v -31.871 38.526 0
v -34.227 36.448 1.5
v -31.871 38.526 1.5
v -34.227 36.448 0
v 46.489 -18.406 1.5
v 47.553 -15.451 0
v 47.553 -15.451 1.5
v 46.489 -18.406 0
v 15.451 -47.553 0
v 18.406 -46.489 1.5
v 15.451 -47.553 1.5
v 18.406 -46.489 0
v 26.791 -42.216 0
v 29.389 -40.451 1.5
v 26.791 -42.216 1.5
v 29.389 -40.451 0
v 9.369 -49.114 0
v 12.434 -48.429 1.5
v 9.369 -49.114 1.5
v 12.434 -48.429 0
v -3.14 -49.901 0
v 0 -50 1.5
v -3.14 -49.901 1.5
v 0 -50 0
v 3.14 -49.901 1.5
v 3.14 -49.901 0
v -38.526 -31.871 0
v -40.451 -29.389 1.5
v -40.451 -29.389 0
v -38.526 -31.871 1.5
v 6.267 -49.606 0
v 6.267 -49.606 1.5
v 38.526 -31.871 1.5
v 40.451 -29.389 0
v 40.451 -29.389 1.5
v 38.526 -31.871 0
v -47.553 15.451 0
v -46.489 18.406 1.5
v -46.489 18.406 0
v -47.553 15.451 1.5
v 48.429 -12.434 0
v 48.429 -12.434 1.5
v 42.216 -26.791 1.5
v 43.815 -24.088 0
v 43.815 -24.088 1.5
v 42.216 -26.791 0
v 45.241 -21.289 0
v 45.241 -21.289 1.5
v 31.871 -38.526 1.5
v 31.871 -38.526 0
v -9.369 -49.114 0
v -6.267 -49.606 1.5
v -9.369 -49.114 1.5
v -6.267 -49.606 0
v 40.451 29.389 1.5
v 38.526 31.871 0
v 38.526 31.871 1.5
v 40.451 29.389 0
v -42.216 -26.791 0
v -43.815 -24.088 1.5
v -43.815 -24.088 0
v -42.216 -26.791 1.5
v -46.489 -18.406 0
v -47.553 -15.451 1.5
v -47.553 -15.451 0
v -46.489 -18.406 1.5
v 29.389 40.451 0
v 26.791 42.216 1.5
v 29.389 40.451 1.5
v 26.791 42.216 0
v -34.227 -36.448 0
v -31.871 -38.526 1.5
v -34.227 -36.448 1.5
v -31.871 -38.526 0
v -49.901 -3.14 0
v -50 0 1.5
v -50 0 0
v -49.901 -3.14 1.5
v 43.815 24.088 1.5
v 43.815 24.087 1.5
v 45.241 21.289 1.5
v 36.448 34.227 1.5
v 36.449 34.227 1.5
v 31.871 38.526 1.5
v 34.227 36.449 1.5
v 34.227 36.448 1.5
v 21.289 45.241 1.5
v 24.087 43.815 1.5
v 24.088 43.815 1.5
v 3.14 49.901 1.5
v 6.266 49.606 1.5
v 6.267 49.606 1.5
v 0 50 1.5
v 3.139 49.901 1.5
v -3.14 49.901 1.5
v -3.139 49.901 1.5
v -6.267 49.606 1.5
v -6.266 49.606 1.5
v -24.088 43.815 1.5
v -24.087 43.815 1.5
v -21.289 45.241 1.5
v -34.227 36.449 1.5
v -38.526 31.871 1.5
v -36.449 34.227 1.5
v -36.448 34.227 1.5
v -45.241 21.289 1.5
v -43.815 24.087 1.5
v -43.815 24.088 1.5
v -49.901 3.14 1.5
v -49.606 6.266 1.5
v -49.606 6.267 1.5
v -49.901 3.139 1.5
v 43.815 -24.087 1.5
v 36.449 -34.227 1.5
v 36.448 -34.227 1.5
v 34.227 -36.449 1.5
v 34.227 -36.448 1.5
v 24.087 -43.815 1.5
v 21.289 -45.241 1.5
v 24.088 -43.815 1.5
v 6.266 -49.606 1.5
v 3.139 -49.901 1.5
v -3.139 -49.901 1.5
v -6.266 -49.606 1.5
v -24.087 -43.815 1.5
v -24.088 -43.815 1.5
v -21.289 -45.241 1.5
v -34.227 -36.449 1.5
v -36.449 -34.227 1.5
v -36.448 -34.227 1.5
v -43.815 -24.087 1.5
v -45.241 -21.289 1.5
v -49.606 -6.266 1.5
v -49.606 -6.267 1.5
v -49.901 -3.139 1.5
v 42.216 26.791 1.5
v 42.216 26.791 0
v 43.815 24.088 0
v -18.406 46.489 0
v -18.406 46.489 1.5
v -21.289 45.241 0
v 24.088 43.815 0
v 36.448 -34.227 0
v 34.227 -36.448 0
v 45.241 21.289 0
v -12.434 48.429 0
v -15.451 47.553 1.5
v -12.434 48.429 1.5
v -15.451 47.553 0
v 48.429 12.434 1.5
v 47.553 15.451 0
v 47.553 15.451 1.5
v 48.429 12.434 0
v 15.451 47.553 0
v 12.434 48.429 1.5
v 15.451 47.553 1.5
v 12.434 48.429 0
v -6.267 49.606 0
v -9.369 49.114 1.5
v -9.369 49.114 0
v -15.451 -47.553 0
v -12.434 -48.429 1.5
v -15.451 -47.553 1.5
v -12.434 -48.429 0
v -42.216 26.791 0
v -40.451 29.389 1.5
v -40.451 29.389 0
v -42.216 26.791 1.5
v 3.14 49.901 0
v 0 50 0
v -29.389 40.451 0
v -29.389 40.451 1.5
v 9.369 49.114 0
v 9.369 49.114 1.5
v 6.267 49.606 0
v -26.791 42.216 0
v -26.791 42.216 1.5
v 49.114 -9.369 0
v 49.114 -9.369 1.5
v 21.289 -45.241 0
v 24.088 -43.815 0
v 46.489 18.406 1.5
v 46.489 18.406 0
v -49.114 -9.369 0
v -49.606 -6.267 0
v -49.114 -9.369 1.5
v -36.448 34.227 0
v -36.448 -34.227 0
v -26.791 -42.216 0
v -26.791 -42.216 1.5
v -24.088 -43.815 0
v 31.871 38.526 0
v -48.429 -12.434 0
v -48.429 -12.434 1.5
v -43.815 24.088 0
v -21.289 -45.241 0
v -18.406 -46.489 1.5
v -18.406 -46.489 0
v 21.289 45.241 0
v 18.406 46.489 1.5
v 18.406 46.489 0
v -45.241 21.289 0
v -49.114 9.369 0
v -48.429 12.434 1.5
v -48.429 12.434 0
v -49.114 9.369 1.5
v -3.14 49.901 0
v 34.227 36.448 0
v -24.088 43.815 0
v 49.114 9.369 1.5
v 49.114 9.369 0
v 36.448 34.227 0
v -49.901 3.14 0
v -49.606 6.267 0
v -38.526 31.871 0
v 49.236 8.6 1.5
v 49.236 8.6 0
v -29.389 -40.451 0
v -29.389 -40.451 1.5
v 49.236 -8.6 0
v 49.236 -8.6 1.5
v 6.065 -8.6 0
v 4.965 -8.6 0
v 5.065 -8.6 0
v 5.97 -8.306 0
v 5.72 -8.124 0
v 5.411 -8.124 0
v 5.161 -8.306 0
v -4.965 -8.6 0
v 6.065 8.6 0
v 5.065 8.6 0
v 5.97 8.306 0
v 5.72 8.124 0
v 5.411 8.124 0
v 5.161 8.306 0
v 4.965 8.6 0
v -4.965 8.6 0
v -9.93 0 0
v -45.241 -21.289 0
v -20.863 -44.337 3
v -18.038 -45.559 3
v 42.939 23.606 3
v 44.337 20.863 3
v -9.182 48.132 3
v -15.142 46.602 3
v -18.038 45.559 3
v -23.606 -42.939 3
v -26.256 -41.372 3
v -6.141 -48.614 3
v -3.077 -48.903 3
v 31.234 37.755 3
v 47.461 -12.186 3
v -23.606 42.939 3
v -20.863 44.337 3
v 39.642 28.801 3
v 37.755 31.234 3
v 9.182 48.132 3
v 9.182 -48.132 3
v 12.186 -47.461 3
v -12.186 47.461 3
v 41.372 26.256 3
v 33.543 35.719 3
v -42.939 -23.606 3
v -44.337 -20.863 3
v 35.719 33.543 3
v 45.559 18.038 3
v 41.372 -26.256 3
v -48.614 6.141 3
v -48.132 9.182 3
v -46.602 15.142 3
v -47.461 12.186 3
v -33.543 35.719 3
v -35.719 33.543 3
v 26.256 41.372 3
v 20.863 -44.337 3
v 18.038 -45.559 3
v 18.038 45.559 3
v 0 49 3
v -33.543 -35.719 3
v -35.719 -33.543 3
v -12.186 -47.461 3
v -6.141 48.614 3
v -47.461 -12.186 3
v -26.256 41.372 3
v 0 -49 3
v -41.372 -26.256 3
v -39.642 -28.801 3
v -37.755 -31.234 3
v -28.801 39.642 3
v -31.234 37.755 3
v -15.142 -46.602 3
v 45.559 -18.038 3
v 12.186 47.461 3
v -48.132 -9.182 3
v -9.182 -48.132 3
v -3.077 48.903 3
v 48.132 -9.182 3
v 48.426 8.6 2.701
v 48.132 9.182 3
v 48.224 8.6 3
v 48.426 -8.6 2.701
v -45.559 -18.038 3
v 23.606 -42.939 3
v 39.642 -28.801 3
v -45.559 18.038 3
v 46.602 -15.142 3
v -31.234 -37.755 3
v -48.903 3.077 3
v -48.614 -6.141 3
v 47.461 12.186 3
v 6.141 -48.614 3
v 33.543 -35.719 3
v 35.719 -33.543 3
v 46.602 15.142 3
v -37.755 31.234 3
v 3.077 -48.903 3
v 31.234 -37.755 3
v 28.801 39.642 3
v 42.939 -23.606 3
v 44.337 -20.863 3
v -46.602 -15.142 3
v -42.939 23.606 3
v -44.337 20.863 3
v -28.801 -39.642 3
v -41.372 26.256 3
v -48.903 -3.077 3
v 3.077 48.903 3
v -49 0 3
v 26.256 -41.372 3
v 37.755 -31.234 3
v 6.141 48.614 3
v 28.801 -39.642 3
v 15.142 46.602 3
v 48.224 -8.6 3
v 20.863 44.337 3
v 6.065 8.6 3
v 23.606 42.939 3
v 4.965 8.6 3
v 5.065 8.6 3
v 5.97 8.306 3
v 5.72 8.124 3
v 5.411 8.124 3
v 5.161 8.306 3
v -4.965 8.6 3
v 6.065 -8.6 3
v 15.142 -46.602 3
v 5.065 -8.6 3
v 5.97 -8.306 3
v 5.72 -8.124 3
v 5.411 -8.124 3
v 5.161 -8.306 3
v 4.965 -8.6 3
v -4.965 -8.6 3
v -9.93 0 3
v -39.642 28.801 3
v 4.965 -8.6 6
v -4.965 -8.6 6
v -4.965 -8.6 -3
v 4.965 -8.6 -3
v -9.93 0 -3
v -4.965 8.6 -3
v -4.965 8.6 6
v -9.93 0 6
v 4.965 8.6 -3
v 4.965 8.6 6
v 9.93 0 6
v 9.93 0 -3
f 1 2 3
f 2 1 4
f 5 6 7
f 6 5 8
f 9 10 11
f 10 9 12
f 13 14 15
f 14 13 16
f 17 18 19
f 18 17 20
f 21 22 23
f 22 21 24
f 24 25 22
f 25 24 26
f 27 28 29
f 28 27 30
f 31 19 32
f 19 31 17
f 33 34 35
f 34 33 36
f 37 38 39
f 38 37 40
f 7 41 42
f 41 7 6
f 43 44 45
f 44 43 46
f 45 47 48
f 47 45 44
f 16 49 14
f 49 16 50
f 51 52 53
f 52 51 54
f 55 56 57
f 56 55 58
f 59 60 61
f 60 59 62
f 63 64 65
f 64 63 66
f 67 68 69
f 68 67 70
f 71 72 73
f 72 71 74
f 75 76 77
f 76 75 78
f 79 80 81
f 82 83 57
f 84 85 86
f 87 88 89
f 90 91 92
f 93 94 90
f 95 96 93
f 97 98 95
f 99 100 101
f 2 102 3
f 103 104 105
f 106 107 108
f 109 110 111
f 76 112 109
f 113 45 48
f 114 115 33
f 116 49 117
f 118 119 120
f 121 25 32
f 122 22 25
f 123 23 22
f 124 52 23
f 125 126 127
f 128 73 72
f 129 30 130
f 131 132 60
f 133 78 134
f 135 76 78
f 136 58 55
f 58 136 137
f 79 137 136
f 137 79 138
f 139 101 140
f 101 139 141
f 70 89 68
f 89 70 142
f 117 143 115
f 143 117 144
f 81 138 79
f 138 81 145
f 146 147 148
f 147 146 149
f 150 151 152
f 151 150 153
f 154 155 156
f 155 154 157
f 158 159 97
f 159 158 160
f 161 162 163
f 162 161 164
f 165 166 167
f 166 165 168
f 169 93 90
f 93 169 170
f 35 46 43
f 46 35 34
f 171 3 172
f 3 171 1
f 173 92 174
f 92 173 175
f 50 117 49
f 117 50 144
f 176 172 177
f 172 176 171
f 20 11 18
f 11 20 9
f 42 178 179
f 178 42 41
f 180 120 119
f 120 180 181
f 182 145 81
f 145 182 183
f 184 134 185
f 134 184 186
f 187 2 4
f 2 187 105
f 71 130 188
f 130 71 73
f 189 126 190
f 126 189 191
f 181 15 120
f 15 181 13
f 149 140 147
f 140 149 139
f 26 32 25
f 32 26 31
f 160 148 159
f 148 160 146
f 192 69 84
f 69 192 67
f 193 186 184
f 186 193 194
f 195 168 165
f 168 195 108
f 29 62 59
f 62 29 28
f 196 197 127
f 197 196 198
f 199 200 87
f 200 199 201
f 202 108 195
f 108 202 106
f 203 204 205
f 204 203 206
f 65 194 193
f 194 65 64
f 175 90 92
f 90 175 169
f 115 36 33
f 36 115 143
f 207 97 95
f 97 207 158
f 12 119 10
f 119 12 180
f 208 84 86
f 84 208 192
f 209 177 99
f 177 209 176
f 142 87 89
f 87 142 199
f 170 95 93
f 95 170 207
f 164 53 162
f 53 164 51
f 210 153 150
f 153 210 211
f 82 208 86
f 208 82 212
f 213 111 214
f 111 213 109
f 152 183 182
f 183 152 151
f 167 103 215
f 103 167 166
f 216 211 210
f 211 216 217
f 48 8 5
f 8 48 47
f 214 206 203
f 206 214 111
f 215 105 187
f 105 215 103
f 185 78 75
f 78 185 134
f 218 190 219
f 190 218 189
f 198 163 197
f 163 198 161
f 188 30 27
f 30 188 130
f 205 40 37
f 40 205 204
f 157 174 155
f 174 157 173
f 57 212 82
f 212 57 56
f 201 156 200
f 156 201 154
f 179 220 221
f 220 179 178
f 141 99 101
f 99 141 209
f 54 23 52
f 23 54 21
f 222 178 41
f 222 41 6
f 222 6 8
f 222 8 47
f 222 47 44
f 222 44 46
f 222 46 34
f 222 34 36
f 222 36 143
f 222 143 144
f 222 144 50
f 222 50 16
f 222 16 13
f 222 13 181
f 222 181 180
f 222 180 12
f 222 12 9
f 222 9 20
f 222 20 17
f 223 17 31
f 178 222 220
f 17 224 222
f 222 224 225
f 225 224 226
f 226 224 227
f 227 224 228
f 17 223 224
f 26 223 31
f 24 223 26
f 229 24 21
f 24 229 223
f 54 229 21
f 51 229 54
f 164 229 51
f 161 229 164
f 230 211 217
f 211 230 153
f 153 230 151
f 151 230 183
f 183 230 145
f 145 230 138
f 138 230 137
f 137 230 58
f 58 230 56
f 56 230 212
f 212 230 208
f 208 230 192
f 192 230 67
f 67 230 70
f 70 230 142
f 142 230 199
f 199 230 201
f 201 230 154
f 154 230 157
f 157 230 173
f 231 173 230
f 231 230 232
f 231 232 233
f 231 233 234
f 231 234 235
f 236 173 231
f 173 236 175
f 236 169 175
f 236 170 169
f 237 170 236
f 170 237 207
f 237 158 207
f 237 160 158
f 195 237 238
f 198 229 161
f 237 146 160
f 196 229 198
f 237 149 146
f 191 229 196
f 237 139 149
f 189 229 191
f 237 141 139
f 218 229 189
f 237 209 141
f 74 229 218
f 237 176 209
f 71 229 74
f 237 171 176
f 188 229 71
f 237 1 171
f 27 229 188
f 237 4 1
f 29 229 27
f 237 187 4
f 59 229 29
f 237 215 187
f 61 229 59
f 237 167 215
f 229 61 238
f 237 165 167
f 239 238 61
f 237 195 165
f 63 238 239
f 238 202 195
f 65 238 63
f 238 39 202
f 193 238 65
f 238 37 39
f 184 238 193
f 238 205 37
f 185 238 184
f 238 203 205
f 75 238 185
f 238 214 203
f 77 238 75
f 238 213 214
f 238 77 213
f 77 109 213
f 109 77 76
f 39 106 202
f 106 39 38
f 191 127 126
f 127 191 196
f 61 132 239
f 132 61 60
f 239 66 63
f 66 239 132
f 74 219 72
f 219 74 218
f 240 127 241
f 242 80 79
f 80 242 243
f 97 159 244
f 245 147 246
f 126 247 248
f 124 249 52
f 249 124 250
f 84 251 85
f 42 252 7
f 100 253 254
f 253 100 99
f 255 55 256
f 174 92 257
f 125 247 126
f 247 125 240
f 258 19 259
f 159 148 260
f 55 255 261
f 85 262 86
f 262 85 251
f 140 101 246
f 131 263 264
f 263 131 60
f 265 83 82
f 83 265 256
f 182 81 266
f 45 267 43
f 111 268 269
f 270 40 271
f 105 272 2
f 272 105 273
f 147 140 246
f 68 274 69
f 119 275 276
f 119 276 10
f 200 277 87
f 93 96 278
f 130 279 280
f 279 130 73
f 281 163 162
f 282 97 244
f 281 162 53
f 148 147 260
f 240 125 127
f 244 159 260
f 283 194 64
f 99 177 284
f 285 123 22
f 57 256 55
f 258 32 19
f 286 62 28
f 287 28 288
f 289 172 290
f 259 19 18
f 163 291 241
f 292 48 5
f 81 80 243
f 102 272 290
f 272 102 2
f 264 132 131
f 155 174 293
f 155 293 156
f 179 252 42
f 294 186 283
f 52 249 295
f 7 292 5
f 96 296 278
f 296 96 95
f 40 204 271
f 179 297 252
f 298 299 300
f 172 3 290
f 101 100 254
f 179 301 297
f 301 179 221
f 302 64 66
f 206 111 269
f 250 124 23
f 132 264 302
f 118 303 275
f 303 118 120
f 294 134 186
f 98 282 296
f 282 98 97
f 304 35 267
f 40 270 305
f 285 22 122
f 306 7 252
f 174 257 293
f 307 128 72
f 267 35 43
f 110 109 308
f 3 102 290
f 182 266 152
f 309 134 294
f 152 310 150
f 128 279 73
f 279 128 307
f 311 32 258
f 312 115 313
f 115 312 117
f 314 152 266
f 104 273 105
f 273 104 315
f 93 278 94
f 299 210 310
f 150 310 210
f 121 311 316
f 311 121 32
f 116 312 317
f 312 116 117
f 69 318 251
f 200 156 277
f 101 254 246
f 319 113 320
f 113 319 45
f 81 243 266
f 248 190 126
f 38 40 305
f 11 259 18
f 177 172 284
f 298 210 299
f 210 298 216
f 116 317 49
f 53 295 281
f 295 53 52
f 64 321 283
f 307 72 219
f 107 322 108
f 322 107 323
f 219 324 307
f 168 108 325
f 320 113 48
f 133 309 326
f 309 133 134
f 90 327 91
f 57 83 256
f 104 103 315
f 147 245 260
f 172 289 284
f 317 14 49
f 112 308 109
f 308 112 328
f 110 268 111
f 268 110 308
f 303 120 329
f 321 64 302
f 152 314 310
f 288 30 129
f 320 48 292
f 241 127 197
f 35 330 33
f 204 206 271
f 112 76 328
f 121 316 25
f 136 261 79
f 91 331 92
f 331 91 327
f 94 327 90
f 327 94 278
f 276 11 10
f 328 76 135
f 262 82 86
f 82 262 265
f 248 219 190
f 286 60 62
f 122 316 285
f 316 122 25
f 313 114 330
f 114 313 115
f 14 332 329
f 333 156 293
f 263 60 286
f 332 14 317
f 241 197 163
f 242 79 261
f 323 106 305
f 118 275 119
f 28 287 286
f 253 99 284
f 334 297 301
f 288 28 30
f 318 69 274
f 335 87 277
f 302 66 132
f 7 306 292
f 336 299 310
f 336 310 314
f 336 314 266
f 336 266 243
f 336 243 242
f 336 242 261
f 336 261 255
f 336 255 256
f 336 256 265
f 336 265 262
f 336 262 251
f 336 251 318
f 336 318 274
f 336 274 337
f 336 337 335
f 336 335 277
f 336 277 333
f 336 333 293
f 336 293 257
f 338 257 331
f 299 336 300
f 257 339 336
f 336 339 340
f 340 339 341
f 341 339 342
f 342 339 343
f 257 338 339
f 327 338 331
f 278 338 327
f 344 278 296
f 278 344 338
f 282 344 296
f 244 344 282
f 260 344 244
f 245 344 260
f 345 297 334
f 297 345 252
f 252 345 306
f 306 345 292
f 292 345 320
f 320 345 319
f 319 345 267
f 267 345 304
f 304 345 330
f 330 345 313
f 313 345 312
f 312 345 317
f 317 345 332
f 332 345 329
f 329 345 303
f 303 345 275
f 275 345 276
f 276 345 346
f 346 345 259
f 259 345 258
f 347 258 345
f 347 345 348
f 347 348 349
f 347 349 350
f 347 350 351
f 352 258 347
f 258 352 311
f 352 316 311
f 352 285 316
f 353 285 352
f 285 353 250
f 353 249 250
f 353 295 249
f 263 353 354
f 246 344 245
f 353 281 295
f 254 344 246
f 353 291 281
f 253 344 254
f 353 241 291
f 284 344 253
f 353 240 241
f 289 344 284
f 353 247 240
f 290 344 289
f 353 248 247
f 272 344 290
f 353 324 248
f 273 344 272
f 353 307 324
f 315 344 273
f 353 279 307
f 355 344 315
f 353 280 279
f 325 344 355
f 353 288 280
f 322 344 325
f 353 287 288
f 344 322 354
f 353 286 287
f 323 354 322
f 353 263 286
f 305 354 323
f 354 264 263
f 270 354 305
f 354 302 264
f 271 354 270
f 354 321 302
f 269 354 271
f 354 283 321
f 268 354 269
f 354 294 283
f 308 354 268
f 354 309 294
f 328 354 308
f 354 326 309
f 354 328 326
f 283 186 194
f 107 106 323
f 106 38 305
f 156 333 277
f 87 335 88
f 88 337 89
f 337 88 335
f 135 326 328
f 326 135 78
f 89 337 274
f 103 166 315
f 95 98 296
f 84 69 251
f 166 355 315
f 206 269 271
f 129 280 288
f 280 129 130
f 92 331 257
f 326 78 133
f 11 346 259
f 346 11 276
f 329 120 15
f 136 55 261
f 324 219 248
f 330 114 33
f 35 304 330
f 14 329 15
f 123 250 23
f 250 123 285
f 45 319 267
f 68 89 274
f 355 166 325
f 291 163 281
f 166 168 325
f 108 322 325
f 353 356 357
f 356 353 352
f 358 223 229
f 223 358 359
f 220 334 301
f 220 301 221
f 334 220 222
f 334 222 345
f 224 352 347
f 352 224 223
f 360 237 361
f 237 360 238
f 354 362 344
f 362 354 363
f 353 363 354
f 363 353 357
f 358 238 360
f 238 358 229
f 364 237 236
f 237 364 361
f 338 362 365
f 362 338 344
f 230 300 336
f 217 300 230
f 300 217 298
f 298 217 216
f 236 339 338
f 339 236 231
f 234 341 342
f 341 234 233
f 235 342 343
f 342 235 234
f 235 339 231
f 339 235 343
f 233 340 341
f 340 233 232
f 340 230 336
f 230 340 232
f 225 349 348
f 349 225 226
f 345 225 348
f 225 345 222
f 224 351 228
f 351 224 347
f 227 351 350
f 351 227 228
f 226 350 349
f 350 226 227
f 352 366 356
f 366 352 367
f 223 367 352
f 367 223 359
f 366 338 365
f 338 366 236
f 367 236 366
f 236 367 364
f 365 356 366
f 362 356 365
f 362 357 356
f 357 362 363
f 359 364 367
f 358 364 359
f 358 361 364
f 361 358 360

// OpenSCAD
tol = 0.1;
eps = 0.0001;
outer_r = 50;
nut_s = 17.2;
inner_r = (nut_s/2)/cos(30);
plate_t = 3;
outer_sm = 100;
test_s = 17;
nub_o = 1;
nub_r = 0.5;
nub_sm = 10;

module plate() {
difference() {
  union() {
    cylinder(r=outer_r,h=plate_t/2,$fn=outer_sm);
    translate([0,0,plate_t/2-eps])
      cylinder(r1=outer_r,r2=outer_r-1,h=plate_t/2+eps,$fn=outer_sm);
  }
  hull() {
    translate([0,0,-tol])
      cylinder(r=inner_r,h=plate_t+2*tol,$fn=6);
    translate([outer_r+nut_s,0,-tol])
      cylinder(r=inner_r,h=plate_t+2*tol,$fn=6);
  }
}
// nubs
translate([inner_r/2+nub_r+tol,nut_s/2,0])
  cylinder(r=nub_r,h=plate_t,$fn=nub_sm);
translate([inner_r/2+nub_r+tol,-nut_s/2,0])
  cylinder(r=nub_r,h=plate_t,$fn=nub_sm);
}

module test1() {
color([0.1,0.8,0.1,0.4])
translate([-test_s/2,-test_s/2,-test_s/2])
  cube([test_s,test_s,test_s]);
}

module test2() {
color([0.1,0.8,0.1,0.4])
    translate([0,0,-plate_t])
      cylinder(r=inner_r,h=3*plate_t,$fn=6);
}

plate();
//test1();
test2();
